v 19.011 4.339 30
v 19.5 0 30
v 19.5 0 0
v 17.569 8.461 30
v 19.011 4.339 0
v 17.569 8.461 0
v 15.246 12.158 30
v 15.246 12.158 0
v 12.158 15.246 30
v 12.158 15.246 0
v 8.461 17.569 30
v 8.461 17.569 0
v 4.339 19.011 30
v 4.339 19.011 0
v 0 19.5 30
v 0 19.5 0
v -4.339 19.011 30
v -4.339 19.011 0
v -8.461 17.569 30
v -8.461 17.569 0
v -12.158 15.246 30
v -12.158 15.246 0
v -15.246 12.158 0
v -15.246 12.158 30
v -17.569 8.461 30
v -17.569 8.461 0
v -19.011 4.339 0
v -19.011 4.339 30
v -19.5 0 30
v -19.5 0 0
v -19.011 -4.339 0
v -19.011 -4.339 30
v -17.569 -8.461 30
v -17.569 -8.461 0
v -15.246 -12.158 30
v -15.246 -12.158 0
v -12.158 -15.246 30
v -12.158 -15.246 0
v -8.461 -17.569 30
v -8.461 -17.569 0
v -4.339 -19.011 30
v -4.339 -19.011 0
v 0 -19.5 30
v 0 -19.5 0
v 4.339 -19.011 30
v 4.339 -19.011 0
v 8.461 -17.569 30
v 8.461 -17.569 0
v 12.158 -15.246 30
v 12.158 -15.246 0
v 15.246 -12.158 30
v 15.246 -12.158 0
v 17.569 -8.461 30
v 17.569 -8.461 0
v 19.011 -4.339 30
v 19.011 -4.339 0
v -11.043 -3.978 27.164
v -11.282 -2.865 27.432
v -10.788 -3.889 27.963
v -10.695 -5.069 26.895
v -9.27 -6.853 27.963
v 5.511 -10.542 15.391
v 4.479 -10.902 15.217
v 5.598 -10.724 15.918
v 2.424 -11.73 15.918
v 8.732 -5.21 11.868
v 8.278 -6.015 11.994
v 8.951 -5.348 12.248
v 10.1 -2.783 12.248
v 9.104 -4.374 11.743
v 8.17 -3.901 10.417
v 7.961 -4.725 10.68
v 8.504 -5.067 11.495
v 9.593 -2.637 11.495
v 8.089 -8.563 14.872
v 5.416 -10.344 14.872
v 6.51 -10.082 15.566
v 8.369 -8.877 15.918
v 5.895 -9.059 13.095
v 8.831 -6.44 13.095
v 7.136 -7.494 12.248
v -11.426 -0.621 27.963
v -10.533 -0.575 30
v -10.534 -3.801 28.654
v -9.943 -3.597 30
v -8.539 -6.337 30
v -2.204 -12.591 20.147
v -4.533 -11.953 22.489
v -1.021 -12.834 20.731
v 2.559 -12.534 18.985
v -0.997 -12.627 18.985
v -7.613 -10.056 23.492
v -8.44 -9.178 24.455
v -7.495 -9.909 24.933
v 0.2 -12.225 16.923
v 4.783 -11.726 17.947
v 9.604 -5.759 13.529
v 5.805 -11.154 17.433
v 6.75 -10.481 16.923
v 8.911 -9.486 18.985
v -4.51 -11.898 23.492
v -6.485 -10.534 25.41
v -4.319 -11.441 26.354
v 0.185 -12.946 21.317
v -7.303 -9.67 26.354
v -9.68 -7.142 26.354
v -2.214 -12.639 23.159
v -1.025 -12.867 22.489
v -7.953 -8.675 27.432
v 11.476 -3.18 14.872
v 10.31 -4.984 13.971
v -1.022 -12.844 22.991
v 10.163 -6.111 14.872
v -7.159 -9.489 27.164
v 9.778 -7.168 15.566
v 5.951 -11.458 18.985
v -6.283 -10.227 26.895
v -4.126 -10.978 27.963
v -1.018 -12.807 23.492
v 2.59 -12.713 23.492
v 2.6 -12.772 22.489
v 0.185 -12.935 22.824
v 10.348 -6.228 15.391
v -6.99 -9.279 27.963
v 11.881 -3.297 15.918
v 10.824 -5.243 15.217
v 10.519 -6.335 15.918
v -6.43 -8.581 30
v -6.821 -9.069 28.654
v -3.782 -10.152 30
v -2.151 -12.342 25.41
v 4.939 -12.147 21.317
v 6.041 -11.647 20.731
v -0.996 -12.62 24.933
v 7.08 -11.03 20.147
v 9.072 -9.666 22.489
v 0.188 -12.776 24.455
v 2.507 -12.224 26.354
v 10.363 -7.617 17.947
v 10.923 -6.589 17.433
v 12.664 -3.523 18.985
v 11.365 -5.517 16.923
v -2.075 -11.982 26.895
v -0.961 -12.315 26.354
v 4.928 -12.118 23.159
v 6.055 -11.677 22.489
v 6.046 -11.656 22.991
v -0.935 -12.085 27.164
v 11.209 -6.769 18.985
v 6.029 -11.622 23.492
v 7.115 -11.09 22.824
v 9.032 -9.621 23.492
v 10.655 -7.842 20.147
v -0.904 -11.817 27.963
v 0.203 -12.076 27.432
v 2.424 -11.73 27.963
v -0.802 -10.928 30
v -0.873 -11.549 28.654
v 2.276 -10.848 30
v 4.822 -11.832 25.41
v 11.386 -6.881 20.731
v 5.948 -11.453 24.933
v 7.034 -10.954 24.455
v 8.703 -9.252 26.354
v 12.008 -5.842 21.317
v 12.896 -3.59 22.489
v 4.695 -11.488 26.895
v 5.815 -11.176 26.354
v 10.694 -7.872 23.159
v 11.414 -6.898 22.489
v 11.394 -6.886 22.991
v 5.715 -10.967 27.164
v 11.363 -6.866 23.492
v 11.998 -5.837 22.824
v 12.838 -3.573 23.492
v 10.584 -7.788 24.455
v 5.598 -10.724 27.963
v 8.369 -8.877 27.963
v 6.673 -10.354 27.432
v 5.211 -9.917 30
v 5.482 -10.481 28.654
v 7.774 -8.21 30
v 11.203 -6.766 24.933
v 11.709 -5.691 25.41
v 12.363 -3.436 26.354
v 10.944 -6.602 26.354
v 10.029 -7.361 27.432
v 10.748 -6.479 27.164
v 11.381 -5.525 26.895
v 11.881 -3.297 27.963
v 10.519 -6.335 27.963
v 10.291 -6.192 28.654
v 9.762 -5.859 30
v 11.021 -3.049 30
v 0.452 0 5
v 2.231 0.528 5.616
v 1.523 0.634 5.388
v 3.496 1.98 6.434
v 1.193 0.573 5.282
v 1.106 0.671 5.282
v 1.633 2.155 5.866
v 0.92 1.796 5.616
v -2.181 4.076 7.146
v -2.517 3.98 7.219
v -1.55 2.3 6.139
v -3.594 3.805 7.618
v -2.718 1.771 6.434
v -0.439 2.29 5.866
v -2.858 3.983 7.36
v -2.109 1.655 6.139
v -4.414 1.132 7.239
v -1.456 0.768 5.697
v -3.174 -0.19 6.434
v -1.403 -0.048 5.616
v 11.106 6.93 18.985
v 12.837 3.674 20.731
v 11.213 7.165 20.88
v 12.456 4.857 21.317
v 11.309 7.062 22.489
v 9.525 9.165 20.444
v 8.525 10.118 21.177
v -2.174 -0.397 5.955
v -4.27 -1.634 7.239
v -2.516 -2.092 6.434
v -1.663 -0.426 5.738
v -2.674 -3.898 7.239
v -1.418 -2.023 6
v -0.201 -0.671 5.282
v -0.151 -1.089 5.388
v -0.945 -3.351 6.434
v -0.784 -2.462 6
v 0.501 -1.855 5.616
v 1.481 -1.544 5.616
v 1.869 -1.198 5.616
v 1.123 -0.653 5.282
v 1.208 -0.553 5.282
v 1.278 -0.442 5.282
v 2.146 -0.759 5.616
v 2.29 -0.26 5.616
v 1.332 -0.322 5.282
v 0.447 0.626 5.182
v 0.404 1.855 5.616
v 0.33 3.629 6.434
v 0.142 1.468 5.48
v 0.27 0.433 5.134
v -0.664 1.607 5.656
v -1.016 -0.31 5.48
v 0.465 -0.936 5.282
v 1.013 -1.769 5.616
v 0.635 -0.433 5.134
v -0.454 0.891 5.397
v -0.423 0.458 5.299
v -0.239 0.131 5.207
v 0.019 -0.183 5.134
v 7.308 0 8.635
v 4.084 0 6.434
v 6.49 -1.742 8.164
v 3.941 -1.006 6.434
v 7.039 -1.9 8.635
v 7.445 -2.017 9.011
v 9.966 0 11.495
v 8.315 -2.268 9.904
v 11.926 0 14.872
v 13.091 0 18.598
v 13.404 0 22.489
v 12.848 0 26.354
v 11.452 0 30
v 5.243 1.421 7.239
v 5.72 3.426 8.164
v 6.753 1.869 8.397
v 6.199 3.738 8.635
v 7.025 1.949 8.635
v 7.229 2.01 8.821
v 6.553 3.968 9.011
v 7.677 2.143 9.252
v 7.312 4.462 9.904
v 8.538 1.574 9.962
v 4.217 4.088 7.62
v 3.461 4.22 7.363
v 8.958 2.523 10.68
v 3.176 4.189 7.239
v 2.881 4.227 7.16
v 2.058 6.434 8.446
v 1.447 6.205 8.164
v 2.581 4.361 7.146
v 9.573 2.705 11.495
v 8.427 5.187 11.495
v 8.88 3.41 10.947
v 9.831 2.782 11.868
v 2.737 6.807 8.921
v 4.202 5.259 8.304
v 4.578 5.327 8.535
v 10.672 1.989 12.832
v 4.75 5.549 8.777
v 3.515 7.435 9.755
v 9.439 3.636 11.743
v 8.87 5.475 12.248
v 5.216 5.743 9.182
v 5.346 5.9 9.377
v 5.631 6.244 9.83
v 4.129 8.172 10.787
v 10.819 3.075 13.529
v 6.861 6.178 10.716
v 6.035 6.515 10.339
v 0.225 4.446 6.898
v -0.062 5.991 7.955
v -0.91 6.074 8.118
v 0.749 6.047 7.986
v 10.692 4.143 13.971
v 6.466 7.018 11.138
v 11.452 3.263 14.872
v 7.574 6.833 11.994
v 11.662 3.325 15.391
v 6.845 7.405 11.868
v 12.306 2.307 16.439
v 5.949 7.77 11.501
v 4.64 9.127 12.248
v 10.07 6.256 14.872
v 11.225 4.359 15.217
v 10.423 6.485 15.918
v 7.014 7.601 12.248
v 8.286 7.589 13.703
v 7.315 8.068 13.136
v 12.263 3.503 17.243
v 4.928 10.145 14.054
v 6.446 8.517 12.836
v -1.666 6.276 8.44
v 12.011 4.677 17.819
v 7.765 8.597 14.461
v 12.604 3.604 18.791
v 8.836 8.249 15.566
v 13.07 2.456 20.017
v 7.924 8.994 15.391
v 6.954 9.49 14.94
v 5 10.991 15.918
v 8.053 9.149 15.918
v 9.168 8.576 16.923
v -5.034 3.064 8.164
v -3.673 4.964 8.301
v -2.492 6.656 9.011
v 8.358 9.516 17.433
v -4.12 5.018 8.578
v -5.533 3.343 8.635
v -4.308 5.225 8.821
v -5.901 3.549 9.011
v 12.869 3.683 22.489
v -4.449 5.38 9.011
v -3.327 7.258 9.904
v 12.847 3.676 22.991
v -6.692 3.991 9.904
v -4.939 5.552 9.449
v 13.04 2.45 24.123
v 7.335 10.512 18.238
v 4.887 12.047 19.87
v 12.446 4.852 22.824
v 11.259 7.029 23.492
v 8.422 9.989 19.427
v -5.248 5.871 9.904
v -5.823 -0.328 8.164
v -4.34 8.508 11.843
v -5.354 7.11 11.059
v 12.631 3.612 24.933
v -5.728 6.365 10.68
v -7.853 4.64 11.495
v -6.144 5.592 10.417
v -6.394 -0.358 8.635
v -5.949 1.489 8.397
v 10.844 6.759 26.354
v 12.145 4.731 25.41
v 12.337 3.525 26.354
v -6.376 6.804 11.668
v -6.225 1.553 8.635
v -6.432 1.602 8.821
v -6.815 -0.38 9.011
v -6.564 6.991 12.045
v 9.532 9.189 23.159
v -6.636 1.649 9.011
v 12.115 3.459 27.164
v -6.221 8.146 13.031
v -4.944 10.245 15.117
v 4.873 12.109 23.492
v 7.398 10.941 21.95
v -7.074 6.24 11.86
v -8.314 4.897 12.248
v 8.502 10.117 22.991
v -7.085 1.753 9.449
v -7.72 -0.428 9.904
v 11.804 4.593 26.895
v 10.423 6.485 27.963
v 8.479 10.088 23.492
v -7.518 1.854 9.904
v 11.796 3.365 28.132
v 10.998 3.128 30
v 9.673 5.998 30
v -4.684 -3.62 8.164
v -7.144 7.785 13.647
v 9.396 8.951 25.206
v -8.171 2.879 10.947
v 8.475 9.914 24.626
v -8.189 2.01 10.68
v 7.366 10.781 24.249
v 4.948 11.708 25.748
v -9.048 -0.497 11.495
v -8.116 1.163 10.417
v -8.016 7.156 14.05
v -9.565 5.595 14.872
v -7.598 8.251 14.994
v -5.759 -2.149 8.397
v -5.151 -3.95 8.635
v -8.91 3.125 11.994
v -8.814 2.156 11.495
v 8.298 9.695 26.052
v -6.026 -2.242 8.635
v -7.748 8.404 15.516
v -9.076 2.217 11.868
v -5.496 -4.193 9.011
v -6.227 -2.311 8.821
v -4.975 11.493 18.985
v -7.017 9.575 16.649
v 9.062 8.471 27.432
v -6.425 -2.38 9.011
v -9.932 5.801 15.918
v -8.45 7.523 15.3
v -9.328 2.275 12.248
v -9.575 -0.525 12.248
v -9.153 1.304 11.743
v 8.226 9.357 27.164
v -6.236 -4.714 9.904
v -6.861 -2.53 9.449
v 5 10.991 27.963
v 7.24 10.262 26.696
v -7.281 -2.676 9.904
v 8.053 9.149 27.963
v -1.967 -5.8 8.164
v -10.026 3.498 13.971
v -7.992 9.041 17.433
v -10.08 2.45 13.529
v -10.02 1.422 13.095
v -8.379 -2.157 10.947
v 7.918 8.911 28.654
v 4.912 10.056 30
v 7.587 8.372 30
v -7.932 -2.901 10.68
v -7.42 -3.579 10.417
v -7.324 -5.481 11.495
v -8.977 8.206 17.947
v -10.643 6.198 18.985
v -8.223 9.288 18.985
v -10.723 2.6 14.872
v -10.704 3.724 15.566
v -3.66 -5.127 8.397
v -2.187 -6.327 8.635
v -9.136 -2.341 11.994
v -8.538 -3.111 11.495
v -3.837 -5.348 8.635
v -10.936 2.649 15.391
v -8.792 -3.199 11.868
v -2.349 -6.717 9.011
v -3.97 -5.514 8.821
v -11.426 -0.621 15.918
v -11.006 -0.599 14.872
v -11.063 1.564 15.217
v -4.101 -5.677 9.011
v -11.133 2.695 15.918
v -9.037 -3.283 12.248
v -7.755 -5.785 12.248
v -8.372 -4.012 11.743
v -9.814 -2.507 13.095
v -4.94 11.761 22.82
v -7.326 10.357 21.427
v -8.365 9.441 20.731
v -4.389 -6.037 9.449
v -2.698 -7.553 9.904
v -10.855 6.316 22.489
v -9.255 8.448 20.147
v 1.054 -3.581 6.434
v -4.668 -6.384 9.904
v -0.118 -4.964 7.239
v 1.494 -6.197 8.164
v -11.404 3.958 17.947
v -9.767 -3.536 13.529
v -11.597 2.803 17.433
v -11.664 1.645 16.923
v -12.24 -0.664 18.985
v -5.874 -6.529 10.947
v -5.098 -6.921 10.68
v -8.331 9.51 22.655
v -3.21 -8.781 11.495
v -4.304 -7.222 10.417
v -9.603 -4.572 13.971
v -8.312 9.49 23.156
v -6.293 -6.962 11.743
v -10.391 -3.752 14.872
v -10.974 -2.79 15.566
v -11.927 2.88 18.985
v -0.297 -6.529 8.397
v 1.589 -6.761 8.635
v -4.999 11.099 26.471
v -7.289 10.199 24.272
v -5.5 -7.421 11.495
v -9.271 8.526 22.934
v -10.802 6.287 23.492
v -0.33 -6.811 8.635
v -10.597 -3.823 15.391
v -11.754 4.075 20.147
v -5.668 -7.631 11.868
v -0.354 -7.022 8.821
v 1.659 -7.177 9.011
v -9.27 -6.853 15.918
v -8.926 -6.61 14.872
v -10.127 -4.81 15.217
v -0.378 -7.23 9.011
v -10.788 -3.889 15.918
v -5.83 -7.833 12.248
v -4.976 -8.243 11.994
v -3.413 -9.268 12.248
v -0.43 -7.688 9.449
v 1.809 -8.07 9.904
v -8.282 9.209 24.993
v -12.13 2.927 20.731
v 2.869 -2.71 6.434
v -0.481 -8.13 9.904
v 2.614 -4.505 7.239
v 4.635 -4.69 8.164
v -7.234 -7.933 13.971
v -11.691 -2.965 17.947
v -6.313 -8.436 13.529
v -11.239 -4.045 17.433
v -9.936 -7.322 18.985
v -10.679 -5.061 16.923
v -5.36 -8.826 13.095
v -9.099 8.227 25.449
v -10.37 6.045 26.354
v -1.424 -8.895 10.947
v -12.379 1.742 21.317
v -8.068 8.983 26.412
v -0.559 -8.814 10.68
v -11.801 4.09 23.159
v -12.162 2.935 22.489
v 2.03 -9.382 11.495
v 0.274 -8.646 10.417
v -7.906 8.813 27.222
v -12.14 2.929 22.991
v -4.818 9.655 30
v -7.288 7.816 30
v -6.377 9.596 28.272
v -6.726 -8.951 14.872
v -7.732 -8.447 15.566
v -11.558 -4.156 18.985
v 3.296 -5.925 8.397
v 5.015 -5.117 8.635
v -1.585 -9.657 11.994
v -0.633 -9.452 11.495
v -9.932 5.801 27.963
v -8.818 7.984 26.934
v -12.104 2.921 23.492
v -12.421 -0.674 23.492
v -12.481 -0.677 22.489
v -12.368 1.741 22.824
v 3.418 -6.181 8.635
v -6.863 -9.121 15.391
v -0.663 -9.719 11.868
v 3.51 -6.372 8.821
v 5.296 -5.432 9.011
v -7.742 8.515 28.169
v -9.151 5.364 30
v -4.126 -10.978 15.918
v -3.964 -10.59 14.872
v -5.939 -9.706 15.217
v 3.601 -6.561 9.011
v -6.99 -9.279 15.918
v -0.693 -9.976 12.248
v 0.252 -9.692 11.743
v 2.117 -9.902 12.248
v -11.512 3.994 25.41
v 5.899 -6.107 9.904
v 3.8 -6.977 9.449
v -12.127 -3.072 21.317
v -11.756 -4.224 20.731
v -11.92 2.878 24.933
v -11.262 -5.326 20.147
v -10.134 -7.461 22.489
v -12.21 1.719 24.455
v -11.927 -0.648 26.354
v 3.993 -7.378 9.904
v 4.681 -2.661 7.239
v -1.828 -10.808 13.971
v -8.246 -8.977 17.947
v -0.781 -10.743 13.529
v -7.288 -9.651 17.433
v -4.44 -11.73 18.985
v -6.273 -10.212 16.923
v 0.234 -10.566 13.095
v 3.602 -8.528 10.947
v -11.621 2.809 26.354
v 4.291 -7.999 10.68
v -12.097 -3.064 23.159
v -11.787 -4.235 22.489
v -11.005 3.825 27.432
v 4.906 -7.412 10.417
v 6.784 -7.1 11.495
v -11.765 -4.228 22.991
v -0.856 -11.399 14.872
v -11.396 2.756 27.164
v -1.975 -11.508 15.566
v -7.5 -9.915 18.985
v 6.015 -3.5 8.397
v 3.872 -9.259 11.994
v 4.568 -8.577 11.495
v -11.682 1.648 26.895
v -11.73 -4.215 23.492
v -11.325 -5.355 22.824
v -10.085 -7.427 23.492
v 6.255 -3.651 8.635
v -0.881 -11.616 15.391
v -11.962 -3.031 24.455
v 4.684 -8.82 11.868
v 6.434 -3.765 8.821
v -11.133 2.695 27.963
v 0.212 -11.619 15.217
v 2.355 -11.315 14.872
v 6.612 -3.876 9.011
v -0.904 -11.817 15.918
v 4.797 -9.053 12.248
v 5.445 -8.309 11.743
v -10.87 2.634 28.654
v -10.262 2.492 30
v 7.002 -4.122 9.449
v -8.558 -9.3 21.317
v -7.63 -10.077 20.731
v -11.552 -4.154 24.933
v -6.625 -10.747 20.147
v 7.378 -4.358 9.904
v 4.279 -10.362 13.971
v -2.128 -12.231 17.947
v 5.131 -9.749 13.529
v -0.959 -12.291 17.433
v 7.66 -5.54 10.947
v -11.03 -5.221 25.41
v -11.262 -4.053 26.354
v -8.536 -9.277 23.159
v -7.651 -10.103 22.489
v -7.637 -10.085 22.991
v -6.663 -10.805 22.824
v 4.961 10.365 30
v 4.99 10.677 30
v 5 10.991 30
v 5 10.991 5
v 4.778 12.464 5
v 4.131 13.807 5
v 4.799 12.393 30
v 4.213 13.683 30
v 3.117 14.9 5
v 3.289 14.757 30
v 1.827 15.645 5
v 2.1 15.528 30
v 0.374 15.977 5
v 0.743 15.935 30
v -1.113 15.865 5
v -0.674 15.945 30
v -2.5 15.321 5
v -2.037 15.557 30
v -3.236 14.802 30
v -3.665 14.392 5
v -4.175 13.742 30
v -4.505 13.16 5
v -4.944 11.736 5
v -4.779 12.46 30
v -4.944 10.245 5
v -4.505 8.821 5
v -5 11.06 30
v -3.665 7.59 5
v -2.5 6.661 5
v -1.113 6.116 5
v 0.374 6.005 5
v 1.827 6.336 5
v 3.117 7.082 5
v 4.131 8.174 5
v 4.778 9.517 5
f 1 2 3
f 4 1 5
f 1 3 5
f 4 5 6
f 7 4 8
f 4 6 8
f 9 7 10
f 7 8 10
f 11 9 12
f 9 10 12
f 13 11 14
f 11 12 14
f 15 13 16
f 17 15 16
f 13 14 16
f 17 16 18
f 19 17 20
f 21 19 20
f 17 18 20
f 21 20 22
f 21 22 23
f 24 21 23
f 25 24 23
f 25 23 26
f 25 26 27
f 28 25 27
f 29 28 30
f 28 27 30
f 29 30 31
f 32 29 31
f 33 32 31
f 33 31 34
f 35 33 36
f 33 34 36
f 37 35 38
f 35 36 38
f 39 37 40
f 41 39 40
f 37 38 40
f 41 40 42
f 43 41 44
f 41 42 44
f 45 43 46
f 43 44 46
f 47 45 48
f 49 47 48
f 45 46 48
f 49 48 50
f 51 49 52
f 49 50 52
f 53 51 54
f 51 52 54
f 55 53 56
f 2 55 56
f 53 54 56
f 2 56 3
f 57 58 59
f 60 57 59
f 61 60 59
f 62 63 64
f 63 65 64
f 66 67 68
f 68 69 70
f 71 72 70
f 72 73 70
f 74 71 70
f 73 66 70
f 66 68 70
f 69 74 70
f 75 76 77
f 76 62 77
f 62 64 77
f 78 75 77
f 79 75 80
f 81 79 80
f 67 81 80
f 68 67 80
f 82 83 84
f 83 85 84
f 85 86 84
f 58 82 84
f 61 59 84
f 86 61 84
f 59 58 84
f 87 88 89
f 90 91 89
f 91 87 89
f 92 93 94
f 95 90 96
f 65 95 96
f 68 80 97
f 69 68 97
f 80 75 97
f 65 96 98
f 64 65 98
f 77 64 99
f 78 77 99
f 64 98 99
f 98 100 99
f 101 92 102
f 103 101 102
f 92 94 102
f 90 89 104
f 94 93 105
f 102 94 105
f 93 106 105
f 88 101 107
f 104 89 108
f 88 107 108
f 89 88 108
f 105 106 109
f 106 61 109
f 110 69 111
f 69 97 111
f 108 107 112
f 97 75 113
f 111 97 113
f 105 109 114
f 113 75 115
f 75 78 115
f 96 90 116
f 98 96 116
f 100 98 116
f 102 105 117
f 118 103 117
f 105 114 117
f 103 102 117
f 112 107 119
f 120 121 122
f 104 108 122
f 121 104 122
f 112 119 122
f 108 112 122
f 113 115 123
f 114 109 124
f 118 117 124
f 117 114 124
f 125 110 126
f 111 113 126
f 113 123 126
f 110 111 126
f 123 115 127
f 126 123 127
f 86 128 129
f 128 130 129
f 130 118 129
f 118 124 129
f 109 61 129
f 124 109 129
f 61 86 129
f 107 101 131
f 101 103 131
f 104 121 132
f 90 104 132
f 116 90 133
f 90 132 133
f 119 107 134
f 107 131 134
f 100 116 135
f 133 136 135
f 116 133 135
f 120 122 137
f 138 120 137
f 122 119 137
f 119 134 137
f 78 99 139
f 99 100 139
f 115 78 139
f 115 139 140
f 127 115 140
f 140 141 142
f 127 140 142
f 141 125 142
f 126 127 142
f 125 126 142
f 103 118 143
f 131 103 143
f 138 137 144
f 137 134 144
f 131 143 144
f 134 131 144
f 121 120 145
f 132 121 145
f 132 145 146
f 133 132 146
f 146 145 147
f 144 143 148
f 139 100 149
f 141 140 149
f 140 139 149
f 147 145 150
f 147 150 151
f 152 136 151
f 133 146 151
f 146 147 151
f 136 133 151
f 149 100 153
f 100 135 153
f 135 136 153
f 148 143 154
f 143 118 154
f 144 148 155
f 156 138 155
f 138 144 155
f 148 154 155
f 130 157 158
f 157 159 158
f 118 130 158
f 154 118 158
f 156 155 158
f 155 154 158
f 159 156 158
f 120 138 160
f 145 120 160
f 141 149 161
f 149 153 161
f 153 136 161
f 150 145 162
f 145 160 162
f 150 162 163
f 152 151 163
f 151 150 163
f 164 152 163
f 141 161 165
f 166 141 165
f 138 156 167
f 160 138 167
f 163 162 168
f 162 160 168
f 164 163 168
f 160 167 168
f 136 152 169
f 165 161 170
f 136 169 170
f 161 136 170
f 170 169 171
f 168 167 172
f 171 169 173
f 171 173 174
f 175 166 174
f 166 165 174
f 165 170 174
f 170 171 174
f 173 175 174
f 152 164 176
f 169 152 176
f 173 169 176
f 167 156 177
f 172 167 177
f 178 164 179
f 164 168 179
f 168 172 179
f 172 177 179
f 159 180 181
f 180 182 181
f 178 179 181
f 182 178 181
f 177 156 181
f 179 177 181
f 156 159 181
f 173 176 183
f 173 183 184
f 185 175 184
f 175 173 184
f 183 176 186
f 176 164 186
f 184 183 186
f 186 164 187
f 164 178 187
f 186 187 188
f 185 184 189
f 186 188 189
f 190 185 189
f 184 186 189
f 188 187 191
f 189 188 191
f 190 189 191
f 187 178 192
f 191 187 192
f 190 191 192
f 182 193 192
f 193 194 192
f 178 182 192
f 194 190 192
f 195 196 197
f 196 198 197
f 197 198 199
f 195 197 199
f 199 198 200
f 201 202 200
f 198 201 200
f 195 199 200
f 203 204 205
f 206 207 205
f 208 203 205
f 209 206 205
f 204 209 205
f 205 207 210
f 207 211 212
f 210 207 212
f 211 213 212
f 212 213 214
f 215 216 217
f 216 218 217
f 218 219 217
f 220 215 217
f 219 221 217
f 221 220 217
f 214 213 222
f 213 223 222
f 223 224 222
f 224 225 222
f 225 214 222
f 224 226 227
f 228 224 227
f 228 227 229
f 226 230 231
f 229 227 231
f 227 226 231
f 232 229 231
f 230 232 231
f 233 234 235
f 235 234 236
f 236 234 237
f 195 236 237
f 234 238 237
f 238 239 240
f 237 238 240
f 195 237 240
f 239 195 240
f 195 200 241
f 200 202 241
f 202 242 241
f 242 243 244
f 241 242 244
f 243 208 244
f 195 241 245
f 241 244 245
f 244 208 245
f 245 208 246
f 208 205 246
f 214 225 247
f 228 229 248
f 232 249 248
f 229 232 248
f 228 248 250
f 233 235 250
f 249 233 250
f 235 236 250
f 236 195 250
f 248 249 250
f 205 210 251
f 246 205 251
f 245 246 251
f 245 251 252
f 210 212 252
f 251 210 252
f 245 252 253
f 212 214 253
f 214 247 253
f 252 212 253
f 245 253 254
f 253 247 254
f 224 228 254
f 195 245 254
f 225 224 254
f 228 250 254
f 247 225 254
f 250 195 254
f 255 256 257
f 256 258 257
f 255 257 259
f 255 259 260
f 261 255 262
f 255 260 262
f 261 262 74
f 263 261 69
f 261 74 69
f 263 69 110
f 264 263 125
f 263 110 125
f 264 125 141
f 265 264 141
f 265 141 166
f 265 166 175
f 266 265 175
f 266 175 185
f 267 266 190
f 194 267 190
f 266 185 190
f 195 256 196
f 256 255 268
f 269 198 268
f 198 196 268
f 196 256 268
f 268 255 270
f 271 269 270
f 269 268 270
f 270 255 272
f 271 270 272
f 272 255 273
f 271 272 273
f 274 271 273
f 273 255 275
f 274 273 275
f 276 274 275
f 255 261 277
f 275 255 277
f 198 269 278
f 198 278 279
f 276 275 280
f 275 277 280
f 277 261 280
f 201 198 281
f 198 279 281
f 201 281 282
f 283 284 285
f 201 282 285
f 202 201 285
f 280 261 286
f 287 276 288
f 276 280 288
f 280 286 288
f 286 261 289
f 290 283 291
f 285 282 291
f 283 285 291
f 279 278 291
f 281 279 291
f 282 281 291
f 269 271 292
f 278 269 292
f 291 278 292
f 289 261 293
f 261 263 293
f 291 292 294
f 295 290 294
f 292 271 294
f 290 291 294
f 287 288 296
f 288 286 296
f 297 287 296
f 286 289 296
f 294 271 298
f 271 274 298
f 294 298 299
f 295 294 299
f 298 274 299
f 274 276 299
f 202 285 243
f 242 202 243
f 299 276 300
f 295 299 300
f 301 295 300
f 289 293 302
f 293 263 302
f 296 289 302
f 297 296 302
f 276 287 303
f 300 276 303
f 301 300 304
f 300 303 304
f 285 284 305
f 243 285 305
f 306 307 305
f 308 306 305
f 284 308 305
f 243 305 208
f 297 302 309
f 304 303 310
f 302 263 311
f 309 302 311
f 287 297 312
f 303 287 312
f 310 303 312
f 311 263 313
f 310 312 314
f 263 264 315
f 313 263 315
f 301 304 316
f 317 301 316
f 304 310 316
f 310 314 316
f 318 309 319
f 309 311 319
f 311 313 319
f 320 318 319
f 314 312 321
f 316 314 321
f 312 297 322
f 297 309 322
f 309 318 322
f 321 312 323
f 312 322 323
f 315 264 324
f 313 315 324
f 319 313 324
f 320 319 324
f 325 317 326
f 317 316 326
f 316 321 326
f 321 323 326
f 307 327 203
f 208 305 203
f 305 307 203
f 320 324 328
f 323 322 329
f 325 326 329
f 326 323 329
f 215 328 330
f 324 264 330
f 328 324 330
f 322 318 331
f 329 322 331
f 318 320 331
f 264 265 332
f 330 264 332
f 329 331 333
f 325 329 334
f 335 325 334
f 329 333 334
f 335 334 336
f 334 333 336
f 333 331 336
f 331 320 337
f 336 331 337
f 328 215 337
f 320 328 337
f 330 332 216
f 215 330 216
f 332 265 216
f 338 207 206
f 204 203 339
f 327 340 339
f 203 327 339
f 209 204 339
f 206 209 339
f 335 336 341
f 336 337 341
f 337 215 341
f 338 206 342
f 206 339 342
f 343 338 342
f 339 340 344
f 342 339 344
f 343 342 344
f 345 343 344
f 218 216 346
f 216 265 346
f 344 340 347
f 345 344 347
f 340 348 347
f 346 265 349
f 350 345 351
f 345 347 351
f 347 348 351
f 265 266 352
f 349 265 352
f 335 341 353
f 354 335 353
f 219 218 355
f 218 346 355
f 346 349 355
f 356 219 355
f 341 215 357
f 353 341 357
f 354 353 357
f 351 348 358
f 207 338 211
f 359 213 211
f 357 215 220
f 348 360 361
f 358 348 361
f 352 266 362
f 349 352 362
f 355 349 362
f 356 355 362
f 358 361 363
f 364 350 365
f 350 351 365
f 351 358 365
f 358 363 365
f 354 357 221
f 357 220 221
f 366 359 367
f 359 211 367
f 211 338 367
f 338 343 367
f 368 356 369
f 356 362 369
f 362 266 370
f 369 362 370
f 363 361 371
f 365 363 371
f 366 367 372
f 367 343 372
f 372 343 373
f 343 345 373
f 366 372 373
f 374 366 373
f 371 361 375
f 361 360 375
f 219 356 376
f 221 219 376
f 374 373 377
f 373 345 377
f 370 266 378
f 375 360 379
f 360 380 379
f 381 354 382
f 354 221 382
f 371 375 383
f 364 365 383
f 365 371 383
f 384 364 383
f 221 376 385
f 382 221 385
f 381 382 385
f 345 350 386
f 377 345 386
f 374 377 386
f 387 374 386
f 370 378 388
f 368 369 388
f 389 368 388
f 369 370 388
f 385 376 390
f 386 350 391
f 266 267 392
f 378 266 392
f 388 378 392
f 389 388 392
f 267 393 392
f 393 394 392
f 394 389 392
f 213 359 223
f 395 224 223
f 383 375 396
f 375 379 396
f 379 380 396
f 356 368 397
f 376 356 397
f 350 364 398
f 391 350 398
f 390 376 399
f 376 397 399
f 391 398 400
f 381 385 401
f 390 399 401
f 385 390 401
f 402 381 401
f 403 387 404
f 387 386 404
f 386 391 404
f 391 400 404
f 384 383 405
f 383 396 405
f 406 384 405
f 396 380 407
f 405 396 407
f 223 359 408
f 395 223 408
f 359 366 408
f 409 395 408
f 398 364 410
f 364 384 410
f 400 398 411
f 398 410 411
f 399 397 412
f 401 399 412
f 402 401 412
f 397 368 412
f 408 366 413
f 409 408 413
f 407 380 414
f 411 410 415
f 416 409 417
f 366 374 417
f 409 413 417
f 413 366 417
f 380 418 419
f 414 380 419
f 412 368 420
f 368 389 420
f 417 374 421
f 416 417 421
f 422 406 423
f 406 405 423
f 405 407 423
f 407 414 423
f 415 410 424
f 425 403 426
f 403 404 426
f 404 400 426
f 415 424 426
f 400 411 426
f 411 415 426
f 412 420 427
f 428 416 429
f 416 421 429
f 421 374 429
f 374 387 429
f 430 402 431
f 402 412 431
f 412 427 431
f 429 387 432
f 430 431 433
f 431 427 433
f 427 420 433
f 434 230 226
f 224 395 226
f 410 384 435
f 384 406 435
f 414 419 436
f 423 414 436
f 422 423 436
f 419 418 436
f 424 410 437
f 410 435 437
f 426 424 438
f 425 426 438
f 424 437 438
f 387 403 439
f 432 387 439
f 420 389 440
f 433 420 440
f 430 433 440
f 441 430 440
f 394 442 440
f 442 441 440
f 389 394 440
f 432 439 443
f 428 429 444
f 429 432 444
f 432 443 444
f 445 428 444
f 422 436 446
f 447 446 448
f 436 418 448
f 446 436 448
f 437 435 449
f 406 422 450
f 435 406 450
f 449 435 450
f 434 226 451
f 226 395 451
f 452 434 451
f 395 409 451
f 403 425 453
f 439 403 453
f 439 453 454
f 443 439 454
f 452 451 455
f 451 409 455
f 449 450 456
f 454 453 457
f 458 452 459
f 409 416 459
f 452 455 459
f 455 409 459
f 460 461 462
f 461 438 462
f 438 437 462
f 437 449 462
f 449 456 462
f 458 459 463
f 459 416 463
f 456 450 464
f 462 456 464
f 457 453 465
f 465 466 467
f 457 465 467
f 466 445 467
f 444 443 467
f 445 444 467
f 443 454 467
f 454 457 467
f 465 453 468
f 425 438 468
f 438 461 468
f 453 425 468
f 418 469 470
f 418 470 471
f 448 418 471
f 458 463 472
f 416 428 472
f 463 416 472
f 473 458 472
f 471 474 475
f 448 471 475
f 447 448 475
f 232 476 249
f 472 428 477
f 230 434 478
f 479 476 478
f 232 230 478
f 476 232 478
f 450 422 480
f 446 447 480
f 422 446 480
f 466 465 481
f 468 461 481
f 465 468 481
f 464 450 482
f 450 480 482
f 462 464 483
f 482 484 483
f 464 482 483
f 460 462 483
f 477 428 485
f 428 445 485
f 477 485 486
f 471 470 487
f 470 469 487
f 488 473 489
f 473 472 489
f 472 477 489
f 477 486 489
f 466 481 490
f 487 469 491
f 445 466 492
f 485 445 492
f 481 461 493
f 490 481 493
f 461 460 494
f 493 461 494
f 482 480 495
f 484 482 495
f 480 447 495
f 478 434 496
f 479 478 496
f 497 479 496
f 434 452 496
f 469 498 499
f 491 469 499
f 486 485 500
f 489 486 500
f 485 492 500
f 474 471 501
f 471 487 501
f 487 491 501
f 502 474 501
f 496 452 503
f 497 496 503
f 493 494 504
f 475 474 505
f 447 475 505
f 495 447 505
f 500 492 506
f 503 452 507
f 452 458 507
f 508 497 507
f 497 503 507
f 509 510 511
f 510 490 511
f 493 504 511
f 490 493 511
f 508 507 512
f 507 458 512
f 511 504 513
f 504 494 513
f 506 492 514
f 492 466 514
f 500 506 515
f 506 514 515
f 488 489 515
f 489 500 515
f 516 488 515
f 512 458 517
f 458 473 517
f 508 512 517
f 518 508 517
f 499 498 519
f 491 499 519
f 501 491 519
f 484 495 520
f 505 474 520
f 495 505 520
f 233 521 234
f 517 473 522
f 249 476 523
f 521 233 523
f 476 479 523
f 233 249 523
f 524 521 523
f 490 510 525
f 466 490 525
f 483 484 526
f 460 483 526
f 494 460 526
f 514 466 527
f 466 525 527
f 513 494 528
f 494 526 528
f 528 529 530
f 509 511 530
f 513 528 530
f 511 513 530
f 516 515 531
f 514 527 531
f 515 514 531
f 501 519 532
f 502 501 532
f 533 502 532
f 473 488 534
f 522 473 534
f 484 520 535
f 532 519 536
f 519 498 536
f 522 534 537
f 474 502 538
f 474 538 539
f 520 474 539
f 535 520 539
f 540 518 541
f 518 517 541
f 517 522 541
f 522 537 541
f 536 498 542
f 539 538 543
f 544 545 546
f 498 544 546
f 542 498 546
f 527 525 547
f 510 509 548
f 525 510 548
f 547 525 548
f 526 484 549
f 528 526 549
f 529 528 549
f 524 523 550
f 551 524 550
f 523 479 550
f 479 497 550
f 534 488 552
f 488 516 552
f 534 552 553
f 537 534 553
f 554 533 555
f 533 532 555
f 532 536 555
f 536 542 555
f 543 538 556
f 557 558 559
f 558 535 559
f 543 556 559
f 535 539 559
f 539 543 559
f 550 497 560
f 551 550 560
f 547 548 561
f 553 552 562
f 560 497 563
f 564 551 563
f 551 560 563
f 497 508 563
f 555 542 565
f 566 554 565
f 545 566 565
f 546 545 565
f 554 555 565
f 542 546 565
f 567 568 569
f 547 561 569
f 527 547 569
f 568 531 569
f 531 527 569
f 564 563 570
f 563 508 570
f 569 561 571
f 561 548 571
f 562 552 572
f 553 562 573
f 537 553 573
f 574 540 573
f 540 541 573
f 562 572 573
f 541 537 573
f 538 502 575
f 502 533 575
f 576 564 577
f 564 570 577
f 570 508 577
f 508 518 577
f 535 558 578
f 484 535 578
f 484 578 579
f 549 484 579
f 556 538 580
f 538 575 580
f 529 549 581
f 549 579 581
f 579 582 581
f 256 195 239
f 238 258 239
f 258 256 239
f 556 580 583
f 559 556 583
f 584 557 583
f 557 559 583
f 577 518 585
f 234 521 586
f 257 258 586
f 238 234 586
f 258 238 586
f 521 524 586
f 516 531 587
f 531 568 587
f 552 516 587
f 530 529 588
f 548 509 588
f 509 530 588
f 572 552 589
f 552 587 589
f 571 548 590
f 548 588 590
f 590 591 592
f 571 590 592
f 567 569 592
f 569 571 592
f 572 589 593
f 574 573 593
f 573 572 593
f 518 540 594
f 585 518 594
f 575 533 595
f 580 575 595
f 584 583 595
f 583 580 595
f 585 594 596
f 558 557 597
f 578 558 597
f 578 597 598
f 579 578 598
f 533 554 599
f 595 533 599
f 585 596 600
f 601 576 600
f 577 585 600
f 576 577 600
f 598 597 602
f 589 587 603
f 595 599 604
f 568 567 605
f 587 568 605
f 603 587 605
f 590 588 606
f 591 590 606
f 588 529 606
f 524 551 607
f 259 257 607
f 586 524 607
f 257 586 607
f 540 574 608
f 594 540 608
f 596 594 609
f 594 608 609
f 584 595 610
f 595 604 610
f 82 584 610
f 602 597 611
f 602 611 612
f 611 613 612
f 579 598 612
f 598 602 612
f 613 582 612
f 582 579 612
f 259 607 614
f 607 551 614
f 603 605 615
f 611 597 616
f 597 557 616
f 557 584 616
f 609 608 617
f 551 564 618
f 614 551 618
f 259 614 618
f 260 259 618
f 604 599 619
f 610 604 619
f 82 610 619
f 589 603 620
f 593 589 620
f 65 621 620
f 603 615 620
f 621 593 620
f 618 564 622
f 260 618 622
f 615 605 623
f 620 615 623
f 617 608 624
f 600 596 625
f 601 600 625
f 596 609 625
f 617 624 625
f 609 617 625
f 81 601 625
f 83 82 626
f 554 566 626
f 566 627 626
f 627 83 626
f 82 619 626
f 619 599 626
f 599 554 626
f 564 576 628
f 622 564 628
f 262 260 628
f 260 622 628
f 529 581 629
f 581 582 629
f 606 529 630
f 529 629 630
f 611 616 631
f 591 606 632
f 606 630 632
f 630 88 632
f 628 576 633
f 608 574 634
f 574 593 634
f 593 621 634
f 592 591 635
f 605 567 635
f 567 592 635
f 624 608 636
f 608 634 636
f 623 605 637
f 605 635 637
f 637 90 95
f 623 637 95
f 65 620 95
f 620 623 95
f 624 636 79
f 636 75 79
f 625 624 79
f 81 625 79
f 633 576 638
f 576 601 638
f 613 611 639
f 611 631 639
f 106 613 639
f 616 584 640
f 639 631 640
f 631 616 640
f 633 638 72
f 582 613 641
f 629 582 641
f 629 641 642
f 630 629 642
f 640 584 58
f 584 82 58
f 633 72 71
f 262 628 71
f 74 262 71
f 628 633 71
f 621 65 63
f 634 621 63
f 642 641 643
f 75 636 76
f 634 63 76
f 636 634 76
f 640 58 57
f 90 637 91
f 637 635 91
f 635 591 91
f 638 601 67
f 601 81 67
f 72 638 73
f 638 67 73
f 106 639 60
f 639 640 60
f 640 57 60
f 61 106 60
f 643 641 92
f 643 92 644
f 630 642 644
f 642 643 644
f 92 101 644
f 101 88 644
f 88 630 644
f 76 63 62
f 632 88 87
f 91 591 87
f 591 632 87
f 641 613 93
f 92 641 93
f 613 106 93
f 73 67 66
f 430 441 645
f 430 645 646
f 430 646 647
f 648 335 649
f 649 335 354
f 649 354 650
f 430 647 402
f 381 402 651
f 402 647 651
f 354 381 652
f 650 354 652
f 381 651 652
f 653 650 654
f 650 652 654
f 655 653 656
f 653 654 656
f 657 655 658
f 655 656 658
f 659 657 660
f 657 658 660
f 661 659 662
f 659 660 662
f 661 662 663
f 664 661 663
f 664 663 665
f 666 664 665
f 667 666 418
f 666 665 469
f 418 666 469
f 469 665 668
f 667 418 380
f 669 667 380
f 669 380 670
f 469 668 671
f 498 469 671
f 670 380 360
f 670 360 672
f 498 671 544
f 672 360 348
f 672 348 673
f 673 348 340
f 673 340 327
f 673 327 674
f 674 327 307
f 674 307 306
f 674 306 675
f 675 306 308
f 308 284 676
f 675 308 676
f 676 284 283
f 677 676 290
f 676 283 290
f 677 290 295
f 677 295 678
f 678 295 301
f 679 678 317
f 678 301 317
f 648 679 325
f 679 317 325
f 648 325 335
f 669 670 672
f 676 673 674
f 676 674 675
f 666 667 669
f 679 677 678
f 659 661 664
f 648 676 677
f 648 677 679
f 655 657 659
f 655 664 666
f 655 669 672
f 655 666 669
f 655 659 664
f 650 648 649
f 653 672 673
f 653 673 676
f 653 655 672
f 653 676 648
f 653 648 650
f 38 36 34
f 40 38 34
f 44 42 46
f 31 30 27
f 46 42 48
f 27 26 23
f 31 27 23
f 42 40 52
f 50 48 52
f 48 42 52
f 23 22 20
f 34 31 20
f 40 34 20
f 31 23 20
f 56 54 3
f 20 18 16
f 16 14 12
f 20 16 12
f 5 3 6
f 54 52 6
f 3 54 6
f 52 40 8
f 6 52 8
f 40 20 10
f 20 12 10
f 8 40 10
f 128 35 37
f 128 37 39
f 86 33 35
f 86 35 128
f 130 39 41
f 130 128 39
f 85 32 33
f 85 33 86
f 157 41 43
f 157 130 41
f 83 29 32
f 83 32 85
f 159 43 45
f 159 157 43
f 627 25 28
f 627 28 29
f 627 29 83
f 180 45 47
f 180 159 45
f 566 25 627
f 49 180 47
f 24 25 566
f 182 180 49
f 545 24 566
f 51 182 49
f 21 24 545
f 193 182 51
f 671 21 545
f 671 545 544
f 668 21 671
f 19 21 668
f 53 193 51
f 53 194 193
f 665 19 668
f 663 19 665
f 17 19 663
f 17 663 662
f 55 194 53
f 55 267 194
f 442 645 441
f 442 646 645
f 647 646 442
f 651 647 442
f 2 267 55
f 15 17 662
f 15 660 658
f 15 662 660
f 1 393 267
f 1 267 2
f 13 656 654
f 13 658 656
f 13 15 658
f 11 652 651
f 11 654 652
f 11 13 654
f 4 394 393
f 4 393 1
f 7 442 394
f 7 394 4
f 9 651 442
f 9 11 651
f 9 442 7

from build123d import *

# Parameters (mm, degrees)
F0_R     = 19.5
F1_DEPTH = 30
F4_R     = 5
F5_DEPTH = 25


with BuildPart() as f1:
    # F0 (on Top) → F1 (new body)
    with BuildSketch(Plane.XY):
        Circle(F0_R)
    extrude(amount=F1_DEPTH)

    # F2 (on Front) → F3 (revolve, cut)
    with BuildSketch(Plane.XZ):
        with BuildLine():
            Line((11.452292, 30), (0.452292, 30))
            Line((0.452292, 30), (0.452292, 5))
            ThreePointArc((0.452292, 5), (11.925941, 14.871595), (11.452292, 30))
        make_face()
    revolve(axis=Axis((0.452292, 0, 17.5), (0, 0, 1)), mode=Mode.SUBTRACT)

    # F4 (on face) → F5 (cut)
    with BuildSketch(Plane.XY.offset(30)):
        with Locations((0, 10.990698)):
            Circle(F4_R)
    extrude(amount=-F5_DEPTH, mode=Mode.SUBTRACT)


solid = f1.part
